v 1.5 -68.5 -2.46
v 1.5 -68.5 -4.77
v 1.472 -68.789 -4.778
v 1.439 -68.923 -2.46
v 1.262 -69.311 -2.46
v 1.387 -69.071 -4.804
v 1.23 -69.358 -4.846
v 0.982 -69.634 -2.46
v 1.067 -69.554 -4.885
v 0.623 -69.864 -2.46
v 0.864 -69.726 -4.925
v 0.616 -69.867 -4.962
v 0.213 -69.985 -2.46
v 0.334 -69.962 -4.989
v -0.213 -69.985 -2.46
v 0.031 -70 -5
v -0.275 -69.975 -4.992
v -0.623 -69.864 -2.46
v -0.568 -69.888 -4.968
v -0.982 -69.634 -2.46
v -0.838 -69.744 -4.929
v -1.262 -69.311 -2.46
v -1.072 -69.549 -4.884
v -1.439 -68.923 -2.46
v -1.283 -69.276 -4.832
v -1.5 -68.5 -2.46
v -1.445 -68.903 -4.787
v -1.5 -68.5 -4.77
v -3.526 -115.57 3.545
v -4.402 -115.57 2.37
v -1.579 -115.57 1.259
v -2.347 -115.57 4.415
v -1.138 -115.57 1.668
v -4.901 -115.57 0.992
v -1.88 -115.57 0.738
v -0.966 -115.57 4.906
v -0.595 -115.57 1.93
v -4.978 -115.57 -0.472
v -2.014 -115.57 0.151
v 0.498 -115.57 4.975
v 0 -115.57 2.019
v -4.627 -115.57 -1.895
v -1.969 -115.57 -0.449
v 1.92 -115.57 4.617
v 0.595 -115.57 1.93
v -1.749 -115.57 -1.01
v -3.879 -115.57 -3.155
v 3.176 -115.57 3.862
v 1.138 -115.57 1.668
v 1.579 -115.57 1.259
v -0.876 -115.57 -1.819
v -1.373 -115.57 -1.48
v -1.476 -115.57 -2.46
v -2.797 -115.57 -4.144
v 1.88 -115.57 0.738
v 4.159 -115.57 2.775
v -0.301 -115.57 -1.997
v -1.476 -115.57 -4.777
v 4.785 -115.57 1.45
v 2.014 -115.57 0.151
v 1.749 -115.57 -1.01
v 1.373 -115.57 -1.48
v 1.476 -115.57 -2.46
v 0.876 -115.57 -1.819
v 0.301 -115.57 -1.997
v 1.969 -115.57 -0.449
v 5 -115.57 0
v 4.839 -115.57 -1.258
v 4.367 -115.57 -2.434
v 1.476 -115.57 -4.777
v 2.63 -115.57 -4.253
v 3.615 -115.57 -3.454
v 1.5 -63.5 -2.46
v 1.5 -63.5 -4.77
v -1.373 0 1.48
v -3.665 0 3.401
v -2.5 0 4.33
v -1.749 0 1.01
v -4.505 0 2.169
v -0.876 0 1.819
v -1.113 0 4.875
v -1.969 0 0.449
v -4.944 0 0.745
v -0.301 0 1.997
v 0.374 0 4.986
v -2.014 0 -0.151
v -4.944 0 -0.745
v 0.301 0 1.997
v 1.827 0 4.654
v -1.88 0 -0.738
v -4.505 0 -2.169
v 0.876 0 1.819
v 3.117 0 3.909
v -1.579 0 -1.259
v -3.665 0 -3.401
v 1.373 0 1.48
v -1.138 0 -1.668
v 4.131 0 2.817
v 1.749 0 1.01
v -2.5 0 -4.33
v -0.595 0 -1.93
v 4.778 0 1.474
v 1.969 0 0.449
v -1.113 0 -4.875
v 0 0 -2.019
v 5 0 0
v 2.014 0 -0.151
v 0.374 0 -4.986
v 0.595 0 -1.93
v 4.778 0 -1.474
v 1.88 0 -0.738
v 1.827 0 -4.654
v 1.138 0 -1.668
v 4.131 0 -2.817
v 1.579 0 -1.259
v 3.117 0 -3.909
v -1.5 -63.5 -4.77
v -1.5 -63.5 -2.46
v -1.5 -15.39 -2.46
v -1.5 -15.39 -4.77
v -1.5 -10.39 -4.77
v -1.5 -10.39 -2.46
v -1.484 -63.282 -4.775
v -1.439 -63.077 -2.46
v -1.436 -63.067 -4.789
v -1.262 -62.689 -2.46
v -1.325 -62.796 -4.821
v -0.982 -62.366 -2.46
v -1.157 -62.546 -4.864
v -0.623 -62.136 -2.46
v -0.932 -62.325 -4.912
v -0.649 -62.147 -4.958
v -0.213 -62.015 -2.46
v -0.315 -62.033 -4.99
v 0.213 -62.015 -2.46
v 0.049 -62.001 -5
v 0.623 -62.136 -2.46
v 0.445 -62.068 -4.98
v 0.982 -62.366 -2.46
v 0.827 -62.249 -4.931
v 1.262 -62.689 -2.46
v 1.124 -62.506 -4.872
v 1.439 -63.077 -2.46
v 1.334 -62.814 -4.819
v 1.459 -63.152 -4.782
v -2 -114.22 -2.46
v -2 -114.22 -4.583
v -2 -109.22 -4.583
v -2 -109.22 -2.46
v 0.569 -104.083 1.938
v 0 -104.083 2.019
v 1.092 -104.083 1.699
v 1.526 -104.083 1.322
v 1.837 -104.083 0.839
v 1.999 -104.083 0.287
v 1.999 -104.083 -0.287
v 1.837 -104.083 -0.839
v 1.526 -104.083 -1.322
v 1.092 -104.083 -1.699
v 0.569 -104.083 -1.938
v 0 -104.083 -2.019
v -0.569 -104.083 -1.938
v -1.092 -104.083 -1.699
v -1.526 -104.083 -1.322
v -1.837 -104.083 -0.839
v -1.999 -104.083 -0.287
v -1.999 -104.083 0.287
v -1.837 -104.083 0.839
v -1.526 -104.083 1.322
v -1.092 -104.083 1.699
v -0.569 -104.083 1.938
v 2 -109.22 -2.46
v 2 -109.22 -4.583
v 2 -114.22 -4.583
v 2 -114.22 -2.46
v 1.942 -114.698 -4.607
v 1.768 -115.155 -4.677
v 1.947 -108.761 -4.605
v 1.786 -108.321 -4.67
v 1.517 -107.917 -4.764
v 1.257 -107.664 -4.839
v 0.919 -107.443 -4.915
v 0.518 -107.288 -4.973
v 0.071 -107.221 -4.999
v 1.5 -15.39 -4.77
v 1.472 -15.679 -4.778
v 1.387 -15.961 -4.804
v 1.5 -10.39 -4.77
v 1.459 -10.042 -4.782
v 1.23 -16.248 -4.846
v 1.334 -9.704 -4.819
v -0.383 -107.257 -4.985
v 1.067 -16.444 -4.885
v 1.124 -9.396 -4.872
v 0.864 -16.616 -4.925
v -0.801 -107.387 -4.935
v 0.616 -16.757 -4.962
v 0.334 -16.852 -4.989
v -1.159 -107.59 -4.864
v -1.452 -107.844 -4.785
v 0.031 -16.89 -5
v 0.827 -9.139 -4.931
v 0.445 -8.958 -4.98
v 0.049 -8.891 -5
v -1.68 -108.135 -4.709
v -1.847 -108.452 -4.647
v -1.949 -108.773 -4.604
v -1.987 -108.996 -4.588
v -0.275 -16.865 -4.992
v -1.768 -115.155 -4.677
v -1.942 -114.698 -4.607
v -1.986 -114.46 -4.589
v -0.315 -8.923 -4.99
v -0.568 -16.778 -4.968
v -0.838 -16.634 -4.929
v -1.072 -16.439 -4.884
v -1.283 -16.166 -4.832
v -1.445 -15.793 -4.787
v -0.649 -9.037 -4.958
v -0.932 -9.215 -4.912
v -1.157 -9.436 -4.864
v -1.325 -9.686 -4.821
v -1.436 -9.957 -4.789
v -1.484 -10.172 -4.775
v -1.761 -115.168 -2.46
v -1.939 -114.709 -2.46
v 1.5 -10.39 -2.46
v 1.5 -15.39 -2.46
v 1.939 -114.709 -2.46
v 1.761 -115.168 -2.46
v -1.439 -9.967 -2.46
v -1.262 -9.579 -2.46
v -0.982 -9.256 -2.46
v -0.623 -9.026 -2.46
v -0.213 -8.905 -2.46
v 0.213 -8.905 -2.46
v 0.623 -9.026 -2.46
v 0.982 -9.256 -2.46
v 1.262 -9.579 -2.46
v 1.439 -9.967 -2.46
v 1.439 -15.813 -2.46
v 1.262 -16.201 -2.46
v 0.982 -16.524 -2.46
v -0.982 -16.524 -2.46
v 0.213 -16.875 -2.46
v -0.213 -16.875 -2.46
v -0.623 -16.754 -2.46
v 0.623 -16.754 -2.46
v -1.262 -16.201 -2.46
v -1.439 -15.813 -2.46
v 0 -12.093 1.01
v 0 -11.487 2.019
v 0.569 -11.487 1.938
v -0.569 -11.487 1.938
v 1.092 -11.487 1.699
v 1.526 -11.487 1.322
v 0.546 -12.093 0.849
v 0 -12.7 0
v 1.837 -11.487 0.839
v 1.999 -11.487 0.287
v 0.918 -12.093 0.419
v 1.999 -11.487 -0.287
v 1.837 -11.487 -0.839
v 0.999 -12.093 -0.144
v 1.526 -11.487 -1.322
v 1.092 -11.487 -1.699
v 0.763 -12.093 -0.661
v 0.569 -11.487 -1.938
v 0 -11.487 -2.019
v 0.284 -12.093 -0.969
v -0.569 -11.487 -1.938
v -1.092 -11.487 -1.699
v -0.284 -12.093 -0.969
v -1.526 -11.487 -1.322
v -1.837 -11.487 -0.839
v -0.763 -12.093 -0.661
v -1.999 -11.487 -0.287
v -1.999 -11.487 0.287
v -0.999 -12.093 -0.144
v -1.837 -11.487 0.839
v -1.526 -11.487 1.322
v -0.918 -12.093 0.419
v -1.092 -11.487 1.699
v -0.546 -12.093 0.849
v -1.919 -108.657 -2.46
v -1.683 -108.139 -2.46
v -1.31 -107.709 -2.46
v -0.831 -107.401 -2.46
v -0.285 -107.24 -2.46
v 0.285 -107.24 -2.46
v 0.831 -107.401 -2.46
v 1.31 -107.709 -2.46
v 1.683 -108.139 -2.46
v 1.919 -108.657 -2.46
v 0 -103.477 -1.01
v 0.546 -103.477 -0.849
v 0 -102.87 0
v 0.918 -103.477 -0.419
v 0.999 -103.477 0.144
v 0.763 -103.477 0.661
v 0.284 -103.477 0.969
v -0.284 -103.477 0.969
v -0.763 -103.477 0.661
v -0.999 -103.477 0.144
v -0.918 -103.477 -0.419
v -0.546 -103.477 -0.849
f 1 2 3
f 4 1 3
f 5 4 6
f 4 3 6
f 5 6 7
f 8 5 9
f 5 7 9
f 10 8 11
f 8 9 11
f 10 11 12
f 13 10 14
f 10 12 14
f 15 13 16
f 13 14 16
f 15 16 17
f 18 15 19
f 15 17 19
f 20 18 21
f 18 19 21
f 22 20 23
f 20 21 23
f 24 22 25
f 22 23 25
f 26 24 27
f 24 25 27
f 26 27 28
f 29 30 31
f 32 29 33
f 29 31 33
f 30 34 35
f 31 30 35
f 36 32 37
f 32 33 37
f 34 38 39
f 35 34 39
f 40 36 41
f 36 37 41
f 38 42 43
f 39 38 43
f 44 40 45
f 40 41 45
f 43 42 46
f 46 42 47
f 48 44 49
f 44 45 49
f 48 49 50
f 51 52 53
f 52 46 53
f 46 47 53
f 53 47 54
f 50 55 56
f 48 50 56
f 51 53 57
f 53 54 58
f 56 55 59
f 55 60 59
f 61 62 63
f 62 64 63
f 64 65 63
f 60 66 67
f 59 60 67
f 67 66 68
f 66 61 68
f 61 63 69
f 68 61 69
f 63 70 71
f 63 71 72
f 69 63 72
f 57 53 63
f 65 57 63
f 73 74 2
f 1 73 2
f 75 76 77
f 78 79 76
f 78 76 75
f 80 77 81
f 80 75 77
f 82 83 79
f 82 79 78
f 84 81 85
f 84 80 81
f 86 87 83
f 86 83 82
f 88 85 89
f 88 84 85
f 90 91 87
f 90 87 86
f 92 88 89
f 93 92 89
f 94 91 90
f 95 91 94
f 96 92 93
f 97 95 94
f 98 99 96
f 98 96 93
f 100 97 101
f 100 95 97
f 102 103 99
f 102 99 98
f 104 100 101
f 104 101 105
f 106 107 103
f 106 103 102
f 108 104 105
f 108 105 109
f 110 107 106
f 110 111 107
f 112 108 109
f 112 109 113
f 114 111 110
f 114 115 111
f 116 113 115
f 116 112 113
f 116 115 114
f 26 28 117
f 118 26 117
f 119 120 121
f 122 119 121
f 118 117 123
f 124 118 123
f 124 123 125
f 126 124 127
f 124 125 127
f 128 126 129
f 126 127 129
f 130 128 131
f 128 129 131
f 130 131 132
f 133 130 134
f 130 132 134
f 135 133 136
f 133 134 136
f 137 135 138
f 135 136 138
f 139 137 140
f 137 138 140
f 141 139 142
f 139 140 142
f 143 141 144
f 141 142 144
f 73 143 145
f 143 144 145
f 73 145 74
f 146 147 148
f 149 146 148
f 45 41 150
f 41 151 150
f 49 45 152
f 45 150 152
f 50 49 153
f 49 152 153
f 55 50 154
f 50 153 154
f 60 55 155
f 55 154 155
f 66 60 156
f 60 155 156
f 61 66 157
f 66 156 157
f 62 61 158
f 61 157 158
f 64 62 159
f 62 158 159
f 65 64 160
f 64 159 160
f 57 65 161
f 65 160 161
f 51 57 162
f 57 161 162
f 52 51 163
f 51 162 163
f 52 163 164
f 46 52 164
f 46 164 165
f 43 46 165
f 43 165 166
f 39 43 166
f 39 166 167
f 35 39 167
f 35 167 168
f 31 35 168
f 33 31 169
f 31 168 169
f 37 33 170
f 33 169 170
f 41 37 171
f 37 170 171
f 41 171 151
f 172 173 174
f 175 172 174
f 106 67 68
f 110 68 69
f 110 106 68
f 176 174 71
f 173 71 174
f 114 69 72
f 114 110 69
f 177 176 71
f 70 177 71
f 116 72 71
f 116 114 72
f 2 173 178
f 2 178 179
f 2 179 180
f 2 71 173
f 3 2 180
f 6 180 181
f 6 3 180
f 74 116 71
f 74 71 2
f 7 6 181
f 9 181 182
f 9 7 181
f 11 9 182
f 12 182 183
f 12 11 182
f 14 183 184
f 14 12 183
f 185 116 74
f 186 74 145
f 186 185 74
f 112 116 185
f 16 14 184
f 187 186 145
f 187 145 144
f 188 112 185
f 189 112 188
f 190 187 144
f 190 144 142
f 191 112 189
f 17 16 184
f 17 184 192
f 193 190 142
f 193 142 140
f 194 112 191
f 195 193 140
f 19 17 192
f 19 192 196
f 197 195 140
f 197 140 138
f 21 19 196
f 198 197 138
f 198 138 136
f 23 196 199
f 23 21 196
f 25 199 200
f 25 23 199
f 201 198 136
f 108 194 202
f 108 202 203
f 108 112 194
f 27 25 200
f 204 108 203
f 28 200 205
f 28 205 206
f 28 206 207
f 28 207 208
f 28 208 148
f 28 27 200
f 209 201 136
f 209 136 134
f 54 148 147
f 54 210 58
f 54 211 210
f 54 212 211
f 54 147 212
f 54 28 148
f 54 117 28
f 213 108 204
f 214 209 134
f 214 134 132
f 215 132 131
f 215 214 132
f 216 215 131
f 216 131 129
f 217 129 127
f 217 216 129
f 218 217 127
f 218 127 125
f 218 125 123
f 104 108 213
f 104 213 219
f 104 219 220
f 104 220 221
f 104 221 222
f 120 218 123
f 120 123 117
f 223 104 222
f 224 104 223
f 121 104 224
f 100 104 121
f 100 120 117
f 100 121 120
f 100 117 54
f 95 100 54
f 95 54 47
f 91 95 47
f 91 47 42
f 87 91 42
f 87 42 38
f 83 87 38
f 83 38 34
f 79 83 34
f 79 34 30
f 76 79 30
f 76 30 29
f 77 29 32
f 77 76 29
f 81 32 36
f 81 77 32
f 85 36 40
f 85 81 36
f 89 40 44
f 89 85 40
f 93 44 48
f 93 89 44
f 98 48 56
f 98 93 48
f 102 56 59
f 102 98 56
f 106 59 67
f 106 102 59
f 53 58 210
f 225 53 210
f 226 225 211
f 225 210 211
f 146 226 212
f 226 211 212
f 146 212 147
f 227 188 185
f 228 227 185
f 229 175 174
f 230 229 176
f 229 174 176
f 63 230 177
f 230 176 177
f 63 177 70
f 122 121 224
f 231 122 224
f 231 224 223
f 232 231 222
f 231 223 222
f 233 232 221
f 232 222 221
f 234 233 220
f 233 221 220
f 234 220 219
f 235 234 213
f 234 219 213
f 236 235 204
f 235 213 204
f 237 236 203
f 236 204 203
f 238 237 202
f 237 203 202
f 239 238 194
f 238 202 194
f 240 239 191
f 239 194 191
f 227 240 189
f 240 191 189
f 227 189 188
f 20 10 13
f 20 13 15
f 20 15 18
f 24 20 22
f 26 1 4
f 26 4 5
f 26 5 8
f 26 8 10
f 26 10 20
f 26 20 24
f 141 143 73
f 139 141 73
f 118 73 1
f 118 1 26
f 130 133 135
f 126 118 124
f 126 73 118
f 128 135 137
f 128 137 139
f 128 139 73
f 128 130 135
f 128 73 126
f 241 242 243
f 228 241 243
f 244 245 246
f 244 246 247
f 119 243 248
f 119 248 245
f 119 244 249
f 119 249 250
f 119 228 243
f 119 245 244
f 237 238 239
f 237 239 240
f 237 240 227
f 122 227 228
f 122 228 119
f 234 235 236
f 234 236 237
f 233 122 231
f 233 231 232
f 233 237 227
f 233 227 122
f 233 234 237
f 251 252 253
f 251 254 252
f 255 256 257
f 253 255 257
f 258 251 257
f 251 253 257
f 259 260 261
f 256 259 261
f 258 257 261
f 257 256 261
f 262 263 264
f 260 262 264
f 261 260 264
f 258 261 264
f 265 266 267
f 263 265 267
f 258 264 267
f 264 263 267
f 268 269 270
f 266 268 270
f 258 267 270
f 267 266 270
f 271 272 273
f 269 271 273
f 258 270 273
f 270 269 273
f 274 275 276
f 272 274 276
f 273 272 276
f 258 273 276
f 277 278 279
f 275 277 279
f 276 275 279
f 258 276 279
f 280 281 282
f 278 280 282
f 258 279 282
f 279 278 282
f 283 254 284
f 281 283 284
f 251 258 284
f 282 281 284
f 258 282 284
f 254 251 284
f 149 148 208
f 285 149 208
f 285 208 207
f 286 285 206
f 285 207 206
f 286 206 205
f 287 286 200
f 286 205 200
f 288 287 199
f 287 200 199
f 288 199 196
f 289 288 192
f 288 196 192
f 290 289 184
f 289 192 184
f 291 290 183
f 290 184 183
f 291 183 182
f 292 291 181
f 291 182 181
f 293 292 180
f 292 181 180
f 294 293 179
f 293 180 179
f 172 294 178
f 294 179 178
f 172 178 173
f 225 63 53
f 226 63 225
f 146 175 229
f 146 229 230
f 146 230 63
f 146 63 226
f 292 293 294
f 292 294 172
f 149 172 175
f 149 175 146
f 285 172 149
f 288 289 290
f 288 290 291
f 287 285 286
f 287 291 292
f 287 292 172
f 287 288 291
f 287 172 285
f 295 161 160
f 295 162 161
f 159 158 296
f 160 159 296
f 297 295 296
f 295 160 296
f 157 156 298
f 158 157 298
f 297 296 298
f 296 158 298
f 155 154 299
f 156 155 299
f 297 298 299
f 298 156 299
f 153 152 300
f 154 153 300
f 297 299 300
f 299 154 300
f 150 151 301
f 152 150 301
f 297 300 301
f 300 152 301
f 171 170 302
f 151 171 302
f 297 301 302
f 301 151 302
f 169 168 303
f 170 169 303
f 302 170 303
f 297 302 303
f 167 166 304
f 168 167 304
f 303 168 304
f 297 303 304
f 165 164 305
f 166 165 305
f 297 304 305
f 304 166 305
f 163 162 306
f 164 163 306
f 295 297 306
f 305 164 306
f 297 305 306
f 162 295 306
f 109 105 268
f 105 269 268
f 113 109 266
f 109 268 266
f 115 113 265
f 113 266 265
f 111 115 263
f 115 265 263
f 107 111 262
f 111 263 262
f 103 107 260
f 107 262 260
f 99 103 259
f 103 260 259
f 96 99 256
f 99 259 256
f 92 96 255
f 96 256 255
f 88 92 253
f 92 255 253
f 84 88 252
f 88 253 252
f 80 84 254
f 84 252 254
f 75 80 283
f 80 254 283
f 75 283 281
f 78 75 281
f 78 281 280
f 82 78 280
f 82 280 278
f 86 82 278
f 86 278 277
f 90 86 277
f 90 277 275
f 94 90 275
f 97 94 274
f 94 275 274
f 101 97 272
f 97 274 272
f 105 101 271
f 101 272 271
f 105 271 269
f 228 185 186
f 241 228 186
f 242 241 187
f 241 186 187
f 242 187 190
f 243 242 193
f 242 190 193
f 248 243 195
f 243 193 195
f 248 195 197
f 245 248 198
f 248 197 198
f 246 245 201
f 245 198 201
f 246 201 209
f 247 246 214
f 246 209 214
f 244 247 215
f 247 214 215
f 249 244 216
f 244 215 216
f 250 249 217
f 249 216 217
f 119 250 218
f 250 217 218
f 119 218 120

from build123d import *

# Parameters (mm, degrees)
SKETCH1_R                                = 5
BOSS_EXTRUDE2_DEPTH                      = 115.57
CUT_EXTRUDE1_DEPTH                       = 2.54
TAP_DRILL_FOR_10_32_TAP1_D               = 4.0386
TAP_DRILL_FOR_10_32_TAP1_DEPTH           = 11.486682152
TAP_DRILL_FOR_10_32_TAP1_TIP             = 1.213317848
TAP_DRILL_FOR_10_32_TAP1_ON_FACE_2_D     = 4.0386
TAP_DRILL_FOR_10_32_TAP1_ON_FACE_2_DEPTH = 11.486682152
TAP_DRILL_FOR_10_32_TAP1_ON_FACE_2_TIP   = 1.213317848


with BuildPart() as part:
    # Sketch1 → Boss-Extrude2 (new body)
    with BuildSketch(Plane(origin=(0, 0, 0), x_dir=(1, 0, 0), z_dir=(0, 1, 0))):
        Circle(SKETCH1_R)
    extrude(amount=-BOSS_EXTRUDE2_DEPTH)

    # Sketch2 → Cut-Extrude1 (cut)
    with BuildSketch(Plane(origin=(0, 0, -5), x_dir=(-1, 0, 0), z_dir=(0, 0, -1))):
        with BuildLine():
            Line((-2, -109.22), (-2, -114.22))
            ThreePointArc((-2, -114.22), (0, -116.22), (2, -114.22))
            Line((2, -114.22), (2, -109.22))
            ThreePointArc((2, -109.22), (0, -107.22), (-2, -109.22))
        make_face()
        with BuildLine():
            Line((-1.5, -63.5), (-1.5, -68.5))
            ThreePointArc((-1.5, -68.5), (0, -70), (1.5, -68.5))
            Line((1.5, -68.5), (1.5, -63.5))
            ThreePointArc((1.5, -63.5), (0, -62), (-1.5, -63.5))
        make_face()
        with BuildLine():
            Line((-1.5, -10.39), (-1.5, -15.39))
            ThreePointArc((-1.5, -15.39), (0, -16.89), (1.5, -15.39))
            Line((1.5, -15.39), (1.5, -10.39))
            ThreePointArc((1.5, -10.39), (0, -8.89), (-1.5, -10.39))
        make_face()
    extrude(amount=-CUT_EXTRUDE1_DEPTH, mode=Mode.SUBTRACT)

    # Tap Drill for #10-32 Tap1
    with Locations(Plane.ZX):
        with Locations((0, 0)):
            Hole(TAP_DRILL_FOR_10_32_TAP1_D / 2, depth=TAP_DRILL_FOR_10_32_TAP1_DEPTH)
            with Locations((0, 0, -(TAP_DRILL_FOR_10_32_TAP1_DEPTH + TAP_DRILL_FOR_10_32_TAP1_TIP / 2))):  # 118° drill point
                Cone(0, TAP_DRILL_FOR_10_32_TAP1_D / 2, TAP_DRILL_FOR_10_32_TAP1_TIP, mode=Mode.SUBTRACT)

    # Tap Drill for #10-32 Tap1 on face 2
    with Locations(Plane(origin=(0, -115.57, 0), x_dir=(0, 0, -1), z_dir=(0, -1, 0))):
        with Locations((0, 0)):
            Hole(TAP_DRILL_FOR_10_32_TAP1_ON_FACE_2_D / 2, depth=TAP_DRILL_FOR_10_32_TAP1_ON_FACE_2_DEPTH)
            with Locations((0, 0, -(TAP_DRILL_FOR_10_32_TAP1_ON_FACE_2_DEPTH + TAP_DRILL_FOR_10_32_TAP1_ON_FACE_2_TIP / 2))):  # 118° drill point
                Cone(0, TAP_DRILL_FOR_10_32_TAP1_ON_FACE_2_D / 2, TAP_DRILL_FOR_10_32_TAP1_ON_FACE_2_TIP, mode=Mode.SUBTRACT)


solid = part.part
